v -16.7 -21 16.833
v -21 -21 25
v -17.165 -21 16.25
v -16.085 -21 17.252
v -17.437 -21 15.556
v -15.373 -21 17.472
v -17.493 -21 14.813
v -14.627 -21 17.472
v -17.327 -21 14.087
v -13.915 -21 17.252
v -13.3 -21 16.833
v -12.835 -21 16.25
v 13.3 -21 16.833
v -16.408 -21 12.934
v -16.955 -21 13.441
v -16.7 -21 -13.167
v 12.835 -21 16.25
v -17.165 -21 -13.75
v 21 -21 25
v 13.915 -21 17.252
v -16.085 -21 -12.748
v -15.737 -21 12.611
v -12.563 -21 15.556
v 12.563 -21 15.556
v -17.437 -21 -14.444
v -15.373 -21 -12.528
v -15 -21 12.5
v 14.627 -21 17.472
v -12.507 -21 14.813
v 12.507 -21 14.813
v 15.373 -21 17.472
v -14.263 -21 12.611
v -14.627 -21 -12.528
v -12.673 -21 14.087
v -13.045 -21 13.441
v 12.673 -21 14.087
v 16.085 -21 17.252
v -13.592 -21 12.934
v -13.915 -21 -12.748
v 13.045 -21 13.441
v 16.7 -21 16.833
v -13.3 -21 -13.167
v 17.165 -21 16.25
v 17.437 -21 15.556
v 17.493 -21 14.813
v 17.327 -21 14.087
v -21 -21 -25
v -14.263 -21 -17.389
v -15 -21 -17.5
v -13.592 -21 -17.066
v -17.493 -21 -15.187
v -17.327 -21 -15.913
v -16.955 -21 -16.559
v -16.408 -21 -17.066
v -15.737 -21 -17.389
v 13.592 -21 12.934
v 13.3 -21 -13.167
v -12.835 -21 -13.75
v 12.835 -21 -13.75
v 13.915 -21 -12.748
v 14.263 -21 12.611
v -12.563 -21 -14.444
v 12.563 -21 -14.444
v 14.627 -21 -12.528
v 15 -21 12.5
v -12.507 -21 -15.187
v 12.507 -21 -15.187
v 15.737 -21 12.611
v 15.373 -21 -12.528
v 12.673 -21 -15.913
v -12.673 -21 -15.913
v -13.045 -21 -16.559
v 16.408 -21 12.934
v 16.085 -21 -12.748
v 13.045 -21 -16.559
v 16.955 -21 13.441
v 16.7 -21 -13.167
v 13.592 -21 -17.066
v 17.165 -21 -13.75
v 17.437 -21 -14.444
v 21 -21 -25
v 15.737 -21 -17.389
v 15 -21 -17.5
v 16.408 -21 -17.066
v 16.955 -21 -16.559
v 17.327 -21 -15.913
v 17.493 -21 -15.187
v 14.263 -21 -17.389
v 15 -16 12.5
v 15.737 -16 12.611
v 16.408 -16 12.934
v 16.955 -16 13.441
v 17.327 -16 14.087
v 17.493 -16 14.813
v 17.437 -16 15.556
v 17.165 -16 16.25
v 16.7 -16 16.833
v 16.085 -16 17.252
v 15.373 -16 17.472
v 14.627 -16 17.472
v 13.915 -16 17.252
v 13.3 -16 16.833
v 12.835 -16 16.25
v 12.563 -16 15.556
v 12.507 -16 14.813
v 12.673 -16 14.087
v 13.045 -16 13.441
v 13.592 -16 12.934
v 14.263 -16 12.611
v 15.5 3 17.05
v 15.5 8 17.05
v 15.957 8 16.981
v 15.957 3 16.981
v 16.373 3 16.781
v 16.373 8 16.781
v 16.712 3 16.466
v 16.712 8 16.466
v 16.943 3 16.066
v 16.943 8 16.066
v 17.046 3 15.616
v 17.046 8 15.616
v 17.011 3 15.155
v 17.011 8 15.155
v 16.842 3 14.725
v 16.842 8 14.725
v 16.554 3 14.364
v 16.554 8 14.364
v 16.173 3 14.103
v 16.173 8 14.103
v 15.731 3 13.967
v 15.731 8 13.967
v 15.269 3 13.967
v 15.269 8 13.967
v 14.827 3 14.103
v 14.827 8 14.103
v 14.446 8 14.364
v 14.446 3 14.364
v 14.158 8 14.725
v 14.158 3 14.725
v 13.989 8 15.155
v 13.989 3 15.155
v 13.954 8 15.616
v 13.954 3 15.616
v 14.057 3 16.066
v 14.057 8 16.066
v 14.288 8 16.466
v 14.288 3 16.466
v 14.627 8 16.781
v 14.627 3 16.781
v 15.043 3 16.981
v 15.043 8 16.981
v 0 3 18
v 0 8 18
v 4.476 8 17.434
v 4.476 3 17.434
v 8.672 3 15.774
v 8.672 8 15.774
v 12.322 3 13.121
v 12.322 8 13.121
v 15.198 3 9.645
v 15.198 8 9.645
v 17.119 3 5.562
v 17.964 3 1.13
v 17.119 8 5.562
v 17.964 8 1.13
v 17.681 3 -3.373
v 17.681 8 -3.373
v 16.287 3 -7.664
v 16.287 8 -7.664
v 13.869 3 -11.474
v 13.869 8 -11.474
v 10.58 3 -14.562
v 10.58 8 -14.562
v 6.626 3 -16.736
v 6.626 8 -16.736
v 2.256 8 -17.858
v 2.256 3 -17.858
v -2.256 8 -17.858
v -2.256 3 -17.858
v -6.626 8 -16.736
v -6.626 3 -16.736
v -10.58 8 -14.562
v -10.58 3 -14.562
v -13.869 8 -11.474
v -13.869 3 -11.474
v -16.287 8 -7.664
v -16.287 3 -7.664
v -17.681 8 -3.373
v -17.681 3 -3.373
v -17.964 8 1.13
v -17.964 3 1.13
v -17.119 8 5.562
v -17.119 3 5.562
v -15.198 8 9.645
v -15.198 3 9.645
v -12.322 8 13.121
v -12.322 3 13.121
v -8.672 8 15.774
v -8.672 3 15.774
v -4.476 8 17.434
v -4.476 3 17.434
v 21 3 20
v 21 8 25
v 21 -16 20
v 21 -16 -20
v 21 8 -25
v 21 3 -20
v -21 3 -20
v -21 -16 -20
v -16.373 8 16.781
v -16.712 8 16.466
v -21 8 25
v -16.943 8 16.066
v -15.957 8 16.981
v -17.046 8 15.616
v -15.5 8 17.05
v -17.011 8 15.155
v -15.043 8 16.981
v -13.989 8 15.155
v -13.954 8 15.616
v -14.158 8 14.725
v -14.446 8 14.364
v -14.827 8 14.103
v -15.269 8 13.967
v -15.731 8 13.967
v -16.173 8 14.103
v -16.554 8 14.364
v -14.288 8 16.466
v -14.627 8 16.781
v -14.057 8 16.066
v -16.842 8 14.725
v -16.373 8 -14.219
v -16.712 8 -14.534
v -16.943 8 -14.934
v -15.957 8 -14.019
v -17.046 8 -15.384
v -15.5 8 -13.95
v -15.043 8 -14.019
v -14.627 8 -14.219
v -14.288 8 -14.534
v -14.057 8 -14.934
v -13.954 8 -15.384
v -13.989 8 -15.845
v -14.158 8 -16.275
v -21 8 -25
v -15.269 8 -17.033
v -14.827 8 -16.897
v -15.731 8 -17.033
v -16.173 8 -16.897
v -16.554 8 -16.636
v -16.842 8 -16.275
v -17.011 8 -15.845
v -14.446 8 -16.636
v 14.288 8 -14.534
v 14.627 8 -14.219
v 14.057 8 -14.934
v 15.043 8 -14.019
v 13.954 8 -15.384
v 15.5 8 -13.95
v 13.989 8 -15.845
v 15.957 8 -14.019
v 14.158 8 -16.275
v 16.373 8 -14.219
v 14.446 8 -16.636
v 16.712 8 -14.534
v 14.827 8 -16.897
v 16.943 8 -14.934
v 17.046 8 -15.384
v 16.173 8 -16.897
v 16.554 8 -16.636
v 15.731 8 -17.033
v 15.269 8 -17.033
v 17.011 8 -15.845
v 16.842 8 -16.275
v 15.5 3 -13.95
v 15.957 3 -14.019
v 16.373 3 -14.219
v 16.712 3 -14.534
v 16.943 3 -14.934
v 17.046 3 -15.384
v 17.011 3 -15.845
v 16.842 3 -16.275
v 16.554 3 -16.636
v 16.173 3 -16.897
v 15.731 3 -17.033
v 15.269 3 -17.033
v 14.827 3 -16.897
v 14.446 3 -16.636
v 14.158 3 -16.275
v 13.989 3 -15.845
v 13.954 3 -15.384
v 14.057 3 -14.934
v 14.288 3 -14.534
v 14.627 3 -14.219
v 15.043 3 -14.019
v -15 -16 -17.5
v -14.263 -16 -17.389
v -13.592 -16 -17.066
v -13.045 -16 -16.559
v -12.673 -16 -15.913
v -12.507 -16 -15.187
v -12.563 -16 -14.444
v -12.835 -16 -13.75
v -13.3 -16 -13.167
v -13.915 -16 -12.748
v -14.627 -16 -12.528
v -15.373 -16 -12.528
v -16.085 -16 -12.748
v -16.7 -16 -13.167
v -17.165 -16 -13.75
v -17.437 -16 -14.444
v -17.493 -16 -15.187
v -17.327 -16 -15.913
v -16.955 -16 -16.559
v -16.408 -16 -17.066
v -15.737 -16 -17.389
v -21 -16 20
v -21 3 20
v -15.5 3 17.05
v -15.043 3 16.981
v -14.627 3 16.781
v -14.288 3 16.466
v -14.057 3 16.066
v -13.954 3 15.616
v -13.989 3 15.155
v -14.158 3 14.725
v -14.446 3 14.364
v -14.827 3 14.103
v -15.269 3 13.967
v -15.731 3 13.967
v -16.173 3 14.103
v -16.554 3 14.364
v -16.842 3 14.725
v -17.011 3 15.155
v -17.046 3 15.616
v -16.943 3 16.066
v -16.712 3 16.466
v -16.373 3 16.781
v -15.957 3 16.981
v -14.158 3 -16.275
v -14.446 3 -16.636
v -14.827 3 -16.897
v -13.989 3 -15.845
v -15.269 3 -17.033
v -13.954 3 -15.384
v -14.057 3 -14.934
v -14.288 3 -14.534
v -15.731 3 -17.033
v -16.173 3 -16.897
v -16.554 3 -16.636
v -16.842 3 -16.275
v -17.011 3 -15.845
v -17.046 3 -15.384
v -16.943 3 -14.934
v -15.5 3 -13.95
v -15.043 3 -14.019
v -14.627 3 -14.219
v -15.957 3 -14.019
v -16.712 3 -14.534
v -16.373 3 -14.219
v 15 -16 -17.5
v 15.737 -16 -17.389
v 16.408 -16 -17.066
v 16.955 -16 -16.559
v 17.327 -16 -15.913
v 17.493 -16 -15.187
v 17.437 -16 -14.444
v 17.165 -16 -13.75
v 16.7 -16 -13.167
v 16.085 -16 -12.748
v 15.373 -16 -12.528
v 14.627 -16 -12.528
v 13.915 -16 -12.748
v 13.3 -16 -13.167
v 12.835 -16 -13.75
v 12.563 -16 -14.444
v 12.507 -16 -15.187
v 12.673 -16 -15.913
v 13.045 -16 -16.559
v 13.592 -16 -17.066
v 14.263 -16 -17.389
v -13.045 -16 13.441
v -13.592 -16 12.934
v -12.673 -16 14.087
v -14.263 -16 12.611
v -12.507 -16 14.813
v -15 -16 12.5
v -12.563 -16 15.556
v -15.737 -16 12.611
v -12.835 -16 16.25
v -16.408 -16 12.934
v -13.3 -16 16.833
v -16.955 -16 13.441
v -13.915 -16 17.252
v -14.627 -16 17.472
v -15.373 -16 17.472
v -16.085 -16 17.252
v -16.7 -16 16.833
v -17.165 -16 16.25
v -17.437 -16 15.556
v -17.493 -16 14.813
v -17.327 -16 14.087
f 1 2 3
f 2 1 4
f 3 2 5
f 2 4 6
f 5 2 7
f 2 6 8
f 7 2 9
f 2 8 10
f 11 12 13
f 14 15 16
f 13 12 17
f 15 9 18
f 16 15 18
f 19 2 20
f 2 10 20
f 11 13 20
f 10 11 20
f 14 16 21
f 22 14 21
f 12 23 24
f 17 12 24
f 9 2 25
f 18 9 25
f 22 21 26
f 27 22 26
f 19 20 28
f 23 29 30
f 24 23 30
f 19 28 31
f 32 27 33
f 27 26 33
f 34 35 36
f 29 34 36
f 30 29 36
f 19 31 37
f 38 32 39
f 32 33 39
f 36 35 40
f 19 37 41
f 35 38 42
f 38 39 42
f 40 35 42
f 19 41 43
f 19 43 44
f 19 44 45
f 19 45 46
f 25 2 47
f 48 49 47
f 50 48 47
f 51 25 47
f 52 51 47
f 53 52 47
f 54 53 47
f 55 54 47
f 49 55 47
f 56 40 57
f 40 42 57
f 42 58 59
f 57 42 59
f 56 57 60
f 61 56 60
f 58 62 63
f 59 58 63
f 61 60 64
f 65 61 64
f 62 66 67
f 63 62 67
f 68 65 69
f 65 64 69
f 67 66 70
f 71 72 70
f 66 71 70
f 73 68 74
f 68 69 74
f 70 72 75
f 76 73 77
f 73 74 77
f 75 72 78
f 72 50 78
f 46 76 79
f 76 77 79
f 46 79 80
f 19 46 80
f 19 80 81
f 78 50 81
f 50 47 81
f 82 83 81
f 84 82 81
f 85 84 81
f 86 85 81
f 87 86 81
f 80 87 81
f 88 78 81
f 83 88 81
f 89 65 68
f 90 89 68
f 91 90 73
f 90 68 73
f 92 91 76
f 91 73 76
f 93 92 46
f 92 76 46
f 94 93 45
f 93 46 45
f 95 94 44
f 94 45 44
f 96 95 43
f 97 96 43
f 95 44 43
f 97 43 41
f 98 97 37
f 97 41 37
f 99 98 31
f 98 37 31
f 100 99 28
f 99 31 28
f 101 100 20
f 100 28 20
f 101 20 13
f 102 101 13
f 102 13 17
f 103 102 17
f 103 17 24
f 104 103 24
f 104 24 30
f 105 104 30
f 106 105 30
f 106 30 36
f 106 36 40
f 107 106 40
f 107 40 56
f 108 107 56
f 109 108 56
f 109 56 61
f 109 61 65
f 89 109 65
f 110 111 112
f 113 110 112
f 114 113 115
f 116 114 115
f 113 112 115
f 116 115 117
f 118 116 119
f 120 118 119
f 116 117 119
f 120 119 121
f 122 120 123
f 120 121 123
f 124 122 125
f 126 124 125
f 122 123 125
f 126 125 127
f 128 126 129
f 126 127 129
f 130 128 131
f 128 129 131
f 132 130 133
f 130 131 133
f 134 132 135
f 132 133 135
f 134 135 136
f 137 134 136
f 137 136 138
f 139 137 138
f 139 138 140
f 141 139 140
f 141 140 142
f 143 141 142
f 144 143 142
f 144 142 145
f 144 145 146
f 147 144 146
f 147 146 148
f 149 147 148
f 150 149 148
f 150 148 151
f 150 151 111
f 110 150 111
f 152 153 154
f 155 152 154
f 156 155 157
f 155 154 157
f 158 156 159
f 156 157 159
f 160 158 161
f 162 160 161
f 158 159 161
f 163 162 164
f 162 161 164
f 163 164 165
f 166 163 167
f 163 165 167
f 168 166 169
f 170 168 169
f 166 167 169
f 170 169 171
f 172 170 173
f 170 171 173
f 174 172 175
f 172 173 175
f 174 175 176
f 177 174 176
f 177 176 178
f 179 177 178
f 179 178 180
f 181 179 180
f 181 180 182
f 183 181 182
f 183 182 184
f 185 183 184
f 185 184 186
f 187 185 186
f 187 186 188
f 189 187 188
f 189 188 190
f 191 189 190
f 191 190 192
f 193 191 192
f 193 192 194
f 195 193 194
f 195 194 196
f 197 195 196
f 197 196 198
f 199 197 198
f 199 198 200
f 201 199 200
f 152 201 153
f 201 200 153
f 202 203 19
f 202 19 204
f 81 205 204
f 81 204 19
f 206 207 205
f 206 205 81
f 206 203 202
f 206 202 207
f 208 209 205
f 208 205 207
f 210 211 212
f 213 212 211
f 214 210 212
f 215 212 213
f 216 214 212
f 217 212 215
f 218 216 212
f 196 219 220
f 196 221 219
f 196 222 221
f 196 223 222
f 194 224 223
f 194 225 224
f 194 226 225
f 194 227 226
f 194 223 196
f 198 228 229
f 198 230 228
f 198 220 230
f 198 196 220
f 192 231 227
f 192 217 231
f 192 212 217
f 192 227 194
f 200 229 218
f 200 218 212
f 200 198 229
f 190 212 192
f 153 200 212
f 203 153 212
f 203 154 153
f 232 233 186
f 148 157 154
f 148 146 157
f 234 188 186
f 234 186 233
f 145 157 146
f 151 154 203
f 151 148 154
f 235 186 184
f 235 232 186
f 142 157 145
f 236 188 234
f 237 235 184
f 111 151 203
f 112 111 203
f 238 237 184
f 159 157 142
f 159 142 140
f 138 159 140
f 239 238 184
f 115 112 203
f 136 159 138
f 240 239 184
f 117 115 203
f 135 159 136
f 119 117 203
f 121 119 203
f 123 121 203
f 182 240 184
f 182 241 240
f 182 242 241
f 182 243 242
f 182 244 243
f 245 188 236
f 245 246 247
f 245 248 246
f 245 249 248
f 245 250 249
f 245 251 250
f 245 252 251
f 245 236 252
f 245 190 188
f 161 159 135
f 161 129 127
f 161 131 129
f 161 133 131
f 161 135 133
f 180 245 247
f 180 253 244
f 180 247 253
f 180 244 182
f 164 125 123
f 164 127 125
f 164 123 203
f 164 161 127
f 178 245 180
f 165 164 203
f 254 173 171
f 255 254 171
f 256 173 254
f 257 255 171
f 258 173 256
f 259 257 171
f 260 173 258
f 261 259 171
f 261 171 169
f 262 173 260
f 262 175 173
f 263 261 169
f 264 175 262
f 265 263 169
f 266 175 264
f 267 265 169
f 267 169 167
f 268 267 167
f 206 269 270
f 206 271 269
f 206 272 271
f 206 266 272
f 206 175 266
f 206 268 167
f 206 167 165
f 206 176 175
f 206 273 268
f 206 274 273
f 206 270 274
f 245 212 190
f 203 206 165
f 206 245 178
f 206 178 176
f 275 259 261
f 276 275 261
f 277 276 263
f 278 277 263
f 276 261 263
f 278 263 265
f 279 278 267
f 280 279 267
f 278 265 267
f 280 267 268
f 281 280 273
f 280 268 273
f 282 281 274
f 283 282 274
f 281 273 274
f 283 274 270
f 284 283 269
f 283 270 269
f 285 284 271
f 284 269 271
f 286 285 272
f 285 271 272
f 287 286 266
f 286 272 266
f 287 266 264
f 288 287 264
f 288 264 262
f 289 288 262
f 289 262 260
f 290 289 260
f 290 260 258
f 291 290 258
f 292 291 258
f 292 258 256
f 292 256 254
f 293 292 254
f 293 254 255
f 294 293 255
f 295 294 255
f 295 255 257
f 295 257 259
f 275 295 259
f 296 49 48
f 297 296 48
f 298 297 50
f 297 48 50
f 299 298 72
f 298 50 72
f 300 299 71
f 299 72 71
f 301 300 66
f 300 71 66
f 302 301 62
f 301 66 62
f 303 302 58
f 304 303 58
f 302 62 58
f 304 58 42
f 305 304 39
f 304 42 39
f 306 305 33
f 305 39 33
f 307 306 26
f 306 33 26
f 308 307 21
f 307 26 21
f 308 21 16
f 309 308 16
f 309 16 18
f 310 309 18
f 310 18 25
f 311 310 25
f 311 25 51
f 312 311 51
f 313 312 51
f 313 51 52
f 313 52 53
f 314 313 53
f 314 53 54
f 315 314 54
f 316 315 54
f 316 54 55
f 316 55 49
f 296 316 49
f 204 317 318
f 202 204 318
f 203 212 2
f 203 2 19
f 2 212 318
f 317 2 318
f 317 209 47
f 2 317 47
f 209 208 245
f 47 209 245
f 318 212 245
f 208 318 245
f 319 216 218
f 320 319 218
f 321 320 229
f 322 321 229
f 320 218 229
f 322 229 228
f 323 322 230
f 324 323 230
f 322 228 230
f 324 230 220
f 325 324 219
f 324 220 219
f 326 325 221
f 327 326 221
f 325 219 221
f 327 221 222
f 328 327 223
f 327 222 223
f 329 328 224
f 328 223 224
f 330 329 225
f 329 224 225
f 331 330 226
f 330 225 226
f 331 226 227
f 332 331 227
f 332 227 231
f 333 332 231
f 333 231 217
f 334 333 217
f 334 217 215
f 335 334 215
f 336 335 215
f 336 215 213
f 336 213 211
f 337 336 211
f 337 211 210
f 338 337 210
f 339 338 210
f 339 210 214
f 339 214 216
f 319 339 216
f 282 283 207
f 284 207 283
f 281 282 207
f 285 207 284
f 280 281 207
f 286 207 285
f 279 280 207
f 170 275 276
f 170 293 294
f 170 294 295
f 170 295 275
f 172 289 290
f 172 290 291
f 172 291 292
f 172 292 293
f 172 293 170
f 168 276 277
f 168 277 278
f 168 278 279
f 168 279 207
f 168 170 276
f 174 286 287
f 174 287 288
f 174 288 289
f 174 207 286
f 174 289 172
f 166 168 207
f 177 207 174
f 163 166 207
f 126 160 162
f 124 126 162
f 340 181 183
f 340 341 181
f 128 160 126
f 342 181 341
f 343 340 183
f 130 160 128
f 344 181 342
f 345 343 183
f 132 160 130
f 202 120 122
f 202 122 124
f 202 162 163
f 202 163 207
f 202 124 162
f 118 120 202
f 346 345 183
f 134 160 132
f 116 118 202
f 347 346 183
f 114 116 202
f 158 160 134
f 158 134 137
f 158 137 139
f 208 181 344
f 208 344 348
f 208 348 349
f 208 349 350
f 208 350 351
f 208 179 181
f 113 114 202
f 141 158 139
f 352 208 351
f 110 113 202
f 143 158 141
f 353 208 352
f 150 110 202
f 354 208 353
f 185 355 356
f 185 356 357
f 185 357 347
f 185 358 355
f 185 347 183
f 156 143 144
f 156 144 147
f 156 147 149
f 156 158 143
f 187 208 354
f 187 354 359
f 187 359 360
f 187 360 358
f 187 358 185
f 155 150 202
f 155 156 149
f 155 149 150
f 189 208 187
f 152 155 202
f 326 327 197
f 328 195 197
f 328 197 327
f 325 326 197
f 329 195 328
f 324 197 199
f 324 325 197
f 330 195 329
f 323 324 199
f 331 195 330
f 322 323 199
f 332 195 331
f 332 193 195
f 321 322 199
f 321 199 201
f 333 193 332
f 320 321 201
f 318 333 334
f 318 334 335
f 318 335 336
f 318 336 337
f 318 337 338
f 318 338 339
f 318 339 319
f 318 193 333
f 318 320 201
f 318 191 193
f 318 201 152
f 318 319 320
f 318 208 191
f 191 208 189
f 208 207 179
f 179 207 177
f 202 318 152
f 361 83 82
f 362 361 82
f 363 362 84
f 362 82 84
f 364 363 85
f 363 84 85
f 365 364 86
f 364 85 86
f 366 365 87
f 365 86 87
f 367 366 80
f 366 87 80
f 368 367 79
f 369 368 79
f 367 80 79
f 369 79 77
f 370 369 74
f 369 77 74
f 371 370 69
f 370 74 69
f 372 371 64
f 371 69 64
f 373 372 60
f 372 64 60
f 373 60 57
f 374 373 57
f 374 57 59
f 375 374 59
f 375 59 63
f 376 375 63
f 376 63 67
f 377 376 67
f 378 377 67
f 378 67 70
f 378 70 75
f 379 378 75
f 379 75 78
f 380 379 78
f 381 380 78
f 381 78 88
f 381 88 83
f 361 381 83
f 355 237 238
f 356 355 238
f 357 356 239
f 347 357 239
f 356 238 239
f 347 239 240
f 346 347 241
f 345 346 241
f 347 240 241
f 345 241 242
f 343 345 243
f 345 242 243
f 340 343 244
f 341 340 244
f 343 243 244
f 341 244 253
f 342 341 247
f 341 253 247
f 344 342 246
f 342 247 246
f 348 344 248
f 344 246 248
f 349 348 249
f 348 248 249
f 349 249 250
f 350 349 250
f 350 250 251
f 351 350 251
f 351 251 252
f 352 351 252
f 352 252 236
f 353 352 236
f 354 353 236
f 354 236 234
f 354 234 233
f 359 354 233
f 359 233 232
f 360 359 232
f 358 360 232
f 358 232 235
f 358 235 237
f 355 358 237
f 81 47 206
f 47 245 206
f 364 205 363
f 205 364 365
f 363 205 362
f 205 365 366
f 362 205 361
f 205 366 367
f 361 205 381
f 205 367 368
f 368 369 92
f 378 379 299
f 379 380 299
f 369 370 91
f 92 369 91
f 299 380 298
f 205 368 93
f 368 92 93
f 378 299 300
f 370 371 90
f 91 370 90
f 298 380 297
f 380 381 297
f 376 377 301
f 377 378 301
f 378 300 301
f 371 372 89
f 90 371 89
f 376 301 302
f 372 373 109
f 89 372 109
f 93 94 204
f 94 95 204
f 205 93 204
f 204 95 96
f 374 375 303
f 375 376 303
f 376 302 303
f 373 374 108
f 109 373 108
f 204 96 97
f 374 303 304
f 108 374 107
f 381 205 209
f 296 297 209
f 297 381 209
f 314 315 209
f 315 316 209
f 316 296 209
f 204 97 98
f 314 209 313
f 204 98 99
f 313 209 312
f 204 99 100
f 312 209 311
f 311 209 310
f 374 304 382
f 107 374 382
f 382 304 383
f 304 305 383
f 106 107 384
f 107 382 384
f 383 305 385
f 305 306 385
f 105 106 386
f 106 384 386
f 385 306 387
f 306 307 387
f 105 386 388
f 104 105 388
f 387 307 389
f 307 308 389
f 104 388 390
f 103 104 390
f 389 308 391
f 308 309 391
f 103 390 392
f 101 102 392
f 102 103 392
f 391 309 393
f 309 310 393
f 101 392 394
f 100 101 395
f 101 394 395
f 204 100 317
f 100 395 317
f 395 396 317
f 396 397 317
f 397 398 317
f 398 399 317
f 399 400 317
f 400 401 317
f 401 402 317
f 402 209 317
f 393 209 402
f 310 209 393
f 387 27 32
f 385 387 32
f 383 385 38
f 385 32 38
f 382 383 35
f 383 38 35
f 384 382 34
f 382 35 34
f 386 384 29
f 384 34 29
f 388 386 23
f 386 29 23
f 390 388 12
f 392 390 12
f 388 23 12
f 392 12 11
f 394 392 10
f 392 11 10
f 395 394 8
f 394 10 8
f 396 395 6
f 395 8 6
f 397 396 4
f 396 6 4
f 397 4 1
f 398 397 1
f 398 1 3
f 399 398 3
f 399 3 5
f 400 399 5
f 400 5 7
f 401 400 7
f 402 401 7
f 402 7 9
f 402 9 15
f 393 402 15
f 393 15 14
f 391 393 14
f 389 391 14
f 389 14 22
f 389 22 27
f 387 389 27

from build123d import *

# Parameters (mm, degrees)
SKETCH1_W           = 42
SKETCH1_H           = 50
BOSS_EXTRUDE1_DEPTH = 8
CUT_EXTRUDE1_REACH  = 35.615
SKETCH2_R           = 1.55
SKETCH2_R_2         = 18
SKETCH3_W           = 42
SKETCH3_H           = 50
BOSS_EXTRUDE2_DEPTH = 21
CUT_EXTRUDE2_REACH  = 55.198
SKETCH4_W           = 40
SKETCH4_H           = 19
CUT_EXTRUDE3_REACH  = 45.669
SKETCH6_R           = 2.5


with BuildPart() as part:
    # Sketch1 → Boss-Extrude1 (new body)
    with BuildSketch(Plane(origin=(0, 0, 0), x_dir=(1, 0, 0), z_dir=(0, 1, 0))):
        Rectangle(SKETCH1_W, SKETCH1_H)
    extrude(amount=BOSS_EXTRUDE1_DEPTH)

    # Sketch2 → Cut-Extrude1 (cut, up to next)
    with BuildSketch(Plane(origin=(0, 8, 0), x_dir=(1, 0, 0), z_dir=(0, 1, 0)), mode=Mode.PRIVATE) as cut_extrude1_sk1:
        with Locations(Location((-15.5, 15.5, 0), (0, 0, 270))):
            Circle(SKETCH2_R)
    cut_extrude1_tool1 = extrude(cut_extrude1_sk1.sketch, amount=-CUT_EXTRUDE1_REACH, mode=Mode.PRIVATE) & part.part
    # Sketch2 → Cut-Extrude1 (cut, up to next)
    with BuildSketch(Plane(origin=(0, 8, 0), x_dir=(1, 0, 0), z_dir=(0, 1, 0)), mode=Mode.PRIVATE) as cut_extrude1_sk2:
        with Locations(Location((15.5, 15.5, 0), (0, 0, 270))):
            Circle(SKETCH2_R)
    cut_extrude1_tool2 = extrude(cut_extrude1_sk2.sketch, amount=-CUT_EXTRUDE1_REACH, mode=Mode.PRIVATE) & part.part
    # Sketch2 → Cut-Extrude1 (cut, up to next)
    with BuildSketch(Plane(origin=(0, 8, 0), x_dir=(1, 0, 0), z_dir=(0, 1, 0)), mode=Mode.PRIVATE) as cut_extrude1_sk3:
        with Locations(Location((15.5, -15.5, 0), (0, 0, 270))):
            Circle(SKETCH2_R)
    cut_extrude1_tool3 = extrude(cut_extrude1_sk3.sketch, amount=-CUT_EXTRUDE1_REACH, mode=Mode.PRIVATE) & part.part
    # Sketch2 → Cut-Extrude1 (cut, up to next)
    with BuildSketch(Plane(origin=(0, 8, 0), x_dir=(1, 0, 0), z_dir=(0, 1, 0)), mode=Mode.PRIVATE) as cut_extrude1_sk4:
        with Locations(Location((-15.5, -15.5, 0), (0, 0, 270))):
            Circle(SKETCH2_R)
    cut_extrude1_tool4 = extrude(cut_extrude1_sk4.sketch, amount=-CUT_EXTRUDE1_REACH, mode=Mode.PRIVATE) & part.part
    # Sketch2 → Cut-Extrude1 (cut, up to next)
    with BuildSketch(Plane(origin=(0, 8, 0), x_dir=(1, 0, 0), z_dir=(0, 1, 0)), mode=Mode.PRIVATE) as cut_extrude1_sk5:
        with Locations(Location((0, 0, 0), (0, 0, 270))):
            Circle(SKETCH2_R_2)
    cut_extrude1_tool5 = extrude(cut_extrude1_sk5.sketch, amount=-CUT_EXTRUDE1_REACH, mode=Mode.PRIVATE) & part.part
    add(cut_extrude1_tool1.solids().sort_by_distance((-15.5, 8, -15.5))[0], mode=Mode.SUBTRACT)
    add(cut_extrude1_tool2.solids().sort_by_distance((15.5, 8, -15.5))[0], mode=Mode.SUBTRACT)
    add(cut_extrude1_tool3.solids().sort_by_distance((15.5, 8, 15.5))[0], mode=Mode.SUBTRACT)
    add(cut_extrude1_tool4.solids().sort_by_distance((-15.5, 8, 15.5))[0], mode=Mode.SUBTRACT)
    add(cut_extrude1_tool5.solids().sort_by_distance((0, 8, 0))[0], mode=Mode.SUBTRACT)

    # Sketch3 → Boss-Extrude2 (add)
    with BuildSketch(Plane(origin=(0, 0, 0), x_dir=(1, 0, 0), z_dir=(0, 1, 0))):
        Rectangle(SKETCH3_W, SKETCH3_H)
    extrude(amount=-BOSS_EXTRUDE2_DEPTH)

    # Sketch4 → Cut-Extrude2 (cut, up to next)
    with BuildSketch(Plane.ZY.offset(21), mode=Mode.PRIVATE) as cut_extrude2_sk1:
        with Locations((0, -6.5)):
            Rectangle(SKETCH4_W, SKETCH4_H)
    cut_extrude2_tool1 = extrude(cut_extrude2_sk1.sketch, amount=-CUT_EXTRUDE2_REACH, mode=Mode.PRIVATE) & part.part
    add(cut_extrude2_tool1.solids().sort_by_distance((-21, -6.5, 0))[0], mode=Mode.SUBTRACT)

    # Sketch6 → Cut-Extrude3 (cut, up to next)
    with BuildSketch(Plane(origin=(0, -21, 0), x_dir=(-1, 0, 0), z_dir=(0, -1, 0)), mode=Mode.PRIVATE) as cut_extrude3_sk1:
        with Locations(Location((-15, 15, 0), (0, 0, 90))):
            Circle(SKETCH6_R)
    cut_extrude3_tool1 = extrude(cut_extrude3_sk1.sketch, amount=-CUT_EXTRUDE3_REACH, mode=Mode.PRIVATE) & part.part
    # Sketch6 → Cut-Extrude3 (cut, up to next)
    with BuildSketch(Plane(origin=(0, -21, 0), x_dir=(-1, 0, 0), z_dir=(0, -1, 0)), mode=Mode.PRIVATE) as cut_extrude3_sk2:
        with Locations(Location((15, 15, 0), (0, 0, 90))):
            Circle(SKETCH6_R)
    cut_extrude3_tool2 = extrude(cut_extrude3_sk2.sketch, amount=-CUT_EXTRUDE3_REACH, mode=Mode.PRIVATE) & part.part
    # Sketch6 → Cut-Extrude3 (cut, up to next)
    with BuildSketch(Plane(origin=(0, -21, 0), x_dir=(-1, 0, 0), z_dir=(0, -1, 0)), mode=Mode.PRIVATE) as cut_extrude3_sk3:
        with Locations(Location((15, -15, 0), (0, 0, 90))):
            Circle(SKETCH6_R)
    cut_extrude3_tool3 = extrude(cut_extrude3_sk3.sketch, amount=-CUT_EXTRUDE3_REACH, mode=Mode.PRIVATE) & part.part
    # Sketch6 → Cut-Extrude3 (cut, up to next)
    with BuildSketch(Plane(origin=(0, -21, 0), x_dir=(-1, 0, 0), z_dir=(0, -1, 0)), mode=Mode.PRIVATE) as cut_extrude3_sk4:
        with Locations(Location((-15, -15, 0), (0, 0, 90))):
            Circle(SKETCH6_R)
    cut_extrude3_tool4 = extrude(cut_extrude3_sk4.sketch, amount=-CUT_EXTRUDE3_REACH, mode=Mode.PRIVATE) & part.part
    add(cut_extrude3_tool1.solids().sort_by_distance((15, -21, -15))[0], mode=Mode.SUBTRACT)
    add(cut_extrude3_tool2.solids().sort_by_distance((-15, -21, -15))[0], mode=Mode.SUBTRACT)
    add(cut_extrude3_tool3.solids().sort_by_distance((-15, -21, 15))[0], mode=Mode.SUBTRACT)
    add(cut_extrude3_tool4.solids().sort_by_distance((15, -21, 15))[0], mode=Mode.SUBTRACT)


solid = part.part
